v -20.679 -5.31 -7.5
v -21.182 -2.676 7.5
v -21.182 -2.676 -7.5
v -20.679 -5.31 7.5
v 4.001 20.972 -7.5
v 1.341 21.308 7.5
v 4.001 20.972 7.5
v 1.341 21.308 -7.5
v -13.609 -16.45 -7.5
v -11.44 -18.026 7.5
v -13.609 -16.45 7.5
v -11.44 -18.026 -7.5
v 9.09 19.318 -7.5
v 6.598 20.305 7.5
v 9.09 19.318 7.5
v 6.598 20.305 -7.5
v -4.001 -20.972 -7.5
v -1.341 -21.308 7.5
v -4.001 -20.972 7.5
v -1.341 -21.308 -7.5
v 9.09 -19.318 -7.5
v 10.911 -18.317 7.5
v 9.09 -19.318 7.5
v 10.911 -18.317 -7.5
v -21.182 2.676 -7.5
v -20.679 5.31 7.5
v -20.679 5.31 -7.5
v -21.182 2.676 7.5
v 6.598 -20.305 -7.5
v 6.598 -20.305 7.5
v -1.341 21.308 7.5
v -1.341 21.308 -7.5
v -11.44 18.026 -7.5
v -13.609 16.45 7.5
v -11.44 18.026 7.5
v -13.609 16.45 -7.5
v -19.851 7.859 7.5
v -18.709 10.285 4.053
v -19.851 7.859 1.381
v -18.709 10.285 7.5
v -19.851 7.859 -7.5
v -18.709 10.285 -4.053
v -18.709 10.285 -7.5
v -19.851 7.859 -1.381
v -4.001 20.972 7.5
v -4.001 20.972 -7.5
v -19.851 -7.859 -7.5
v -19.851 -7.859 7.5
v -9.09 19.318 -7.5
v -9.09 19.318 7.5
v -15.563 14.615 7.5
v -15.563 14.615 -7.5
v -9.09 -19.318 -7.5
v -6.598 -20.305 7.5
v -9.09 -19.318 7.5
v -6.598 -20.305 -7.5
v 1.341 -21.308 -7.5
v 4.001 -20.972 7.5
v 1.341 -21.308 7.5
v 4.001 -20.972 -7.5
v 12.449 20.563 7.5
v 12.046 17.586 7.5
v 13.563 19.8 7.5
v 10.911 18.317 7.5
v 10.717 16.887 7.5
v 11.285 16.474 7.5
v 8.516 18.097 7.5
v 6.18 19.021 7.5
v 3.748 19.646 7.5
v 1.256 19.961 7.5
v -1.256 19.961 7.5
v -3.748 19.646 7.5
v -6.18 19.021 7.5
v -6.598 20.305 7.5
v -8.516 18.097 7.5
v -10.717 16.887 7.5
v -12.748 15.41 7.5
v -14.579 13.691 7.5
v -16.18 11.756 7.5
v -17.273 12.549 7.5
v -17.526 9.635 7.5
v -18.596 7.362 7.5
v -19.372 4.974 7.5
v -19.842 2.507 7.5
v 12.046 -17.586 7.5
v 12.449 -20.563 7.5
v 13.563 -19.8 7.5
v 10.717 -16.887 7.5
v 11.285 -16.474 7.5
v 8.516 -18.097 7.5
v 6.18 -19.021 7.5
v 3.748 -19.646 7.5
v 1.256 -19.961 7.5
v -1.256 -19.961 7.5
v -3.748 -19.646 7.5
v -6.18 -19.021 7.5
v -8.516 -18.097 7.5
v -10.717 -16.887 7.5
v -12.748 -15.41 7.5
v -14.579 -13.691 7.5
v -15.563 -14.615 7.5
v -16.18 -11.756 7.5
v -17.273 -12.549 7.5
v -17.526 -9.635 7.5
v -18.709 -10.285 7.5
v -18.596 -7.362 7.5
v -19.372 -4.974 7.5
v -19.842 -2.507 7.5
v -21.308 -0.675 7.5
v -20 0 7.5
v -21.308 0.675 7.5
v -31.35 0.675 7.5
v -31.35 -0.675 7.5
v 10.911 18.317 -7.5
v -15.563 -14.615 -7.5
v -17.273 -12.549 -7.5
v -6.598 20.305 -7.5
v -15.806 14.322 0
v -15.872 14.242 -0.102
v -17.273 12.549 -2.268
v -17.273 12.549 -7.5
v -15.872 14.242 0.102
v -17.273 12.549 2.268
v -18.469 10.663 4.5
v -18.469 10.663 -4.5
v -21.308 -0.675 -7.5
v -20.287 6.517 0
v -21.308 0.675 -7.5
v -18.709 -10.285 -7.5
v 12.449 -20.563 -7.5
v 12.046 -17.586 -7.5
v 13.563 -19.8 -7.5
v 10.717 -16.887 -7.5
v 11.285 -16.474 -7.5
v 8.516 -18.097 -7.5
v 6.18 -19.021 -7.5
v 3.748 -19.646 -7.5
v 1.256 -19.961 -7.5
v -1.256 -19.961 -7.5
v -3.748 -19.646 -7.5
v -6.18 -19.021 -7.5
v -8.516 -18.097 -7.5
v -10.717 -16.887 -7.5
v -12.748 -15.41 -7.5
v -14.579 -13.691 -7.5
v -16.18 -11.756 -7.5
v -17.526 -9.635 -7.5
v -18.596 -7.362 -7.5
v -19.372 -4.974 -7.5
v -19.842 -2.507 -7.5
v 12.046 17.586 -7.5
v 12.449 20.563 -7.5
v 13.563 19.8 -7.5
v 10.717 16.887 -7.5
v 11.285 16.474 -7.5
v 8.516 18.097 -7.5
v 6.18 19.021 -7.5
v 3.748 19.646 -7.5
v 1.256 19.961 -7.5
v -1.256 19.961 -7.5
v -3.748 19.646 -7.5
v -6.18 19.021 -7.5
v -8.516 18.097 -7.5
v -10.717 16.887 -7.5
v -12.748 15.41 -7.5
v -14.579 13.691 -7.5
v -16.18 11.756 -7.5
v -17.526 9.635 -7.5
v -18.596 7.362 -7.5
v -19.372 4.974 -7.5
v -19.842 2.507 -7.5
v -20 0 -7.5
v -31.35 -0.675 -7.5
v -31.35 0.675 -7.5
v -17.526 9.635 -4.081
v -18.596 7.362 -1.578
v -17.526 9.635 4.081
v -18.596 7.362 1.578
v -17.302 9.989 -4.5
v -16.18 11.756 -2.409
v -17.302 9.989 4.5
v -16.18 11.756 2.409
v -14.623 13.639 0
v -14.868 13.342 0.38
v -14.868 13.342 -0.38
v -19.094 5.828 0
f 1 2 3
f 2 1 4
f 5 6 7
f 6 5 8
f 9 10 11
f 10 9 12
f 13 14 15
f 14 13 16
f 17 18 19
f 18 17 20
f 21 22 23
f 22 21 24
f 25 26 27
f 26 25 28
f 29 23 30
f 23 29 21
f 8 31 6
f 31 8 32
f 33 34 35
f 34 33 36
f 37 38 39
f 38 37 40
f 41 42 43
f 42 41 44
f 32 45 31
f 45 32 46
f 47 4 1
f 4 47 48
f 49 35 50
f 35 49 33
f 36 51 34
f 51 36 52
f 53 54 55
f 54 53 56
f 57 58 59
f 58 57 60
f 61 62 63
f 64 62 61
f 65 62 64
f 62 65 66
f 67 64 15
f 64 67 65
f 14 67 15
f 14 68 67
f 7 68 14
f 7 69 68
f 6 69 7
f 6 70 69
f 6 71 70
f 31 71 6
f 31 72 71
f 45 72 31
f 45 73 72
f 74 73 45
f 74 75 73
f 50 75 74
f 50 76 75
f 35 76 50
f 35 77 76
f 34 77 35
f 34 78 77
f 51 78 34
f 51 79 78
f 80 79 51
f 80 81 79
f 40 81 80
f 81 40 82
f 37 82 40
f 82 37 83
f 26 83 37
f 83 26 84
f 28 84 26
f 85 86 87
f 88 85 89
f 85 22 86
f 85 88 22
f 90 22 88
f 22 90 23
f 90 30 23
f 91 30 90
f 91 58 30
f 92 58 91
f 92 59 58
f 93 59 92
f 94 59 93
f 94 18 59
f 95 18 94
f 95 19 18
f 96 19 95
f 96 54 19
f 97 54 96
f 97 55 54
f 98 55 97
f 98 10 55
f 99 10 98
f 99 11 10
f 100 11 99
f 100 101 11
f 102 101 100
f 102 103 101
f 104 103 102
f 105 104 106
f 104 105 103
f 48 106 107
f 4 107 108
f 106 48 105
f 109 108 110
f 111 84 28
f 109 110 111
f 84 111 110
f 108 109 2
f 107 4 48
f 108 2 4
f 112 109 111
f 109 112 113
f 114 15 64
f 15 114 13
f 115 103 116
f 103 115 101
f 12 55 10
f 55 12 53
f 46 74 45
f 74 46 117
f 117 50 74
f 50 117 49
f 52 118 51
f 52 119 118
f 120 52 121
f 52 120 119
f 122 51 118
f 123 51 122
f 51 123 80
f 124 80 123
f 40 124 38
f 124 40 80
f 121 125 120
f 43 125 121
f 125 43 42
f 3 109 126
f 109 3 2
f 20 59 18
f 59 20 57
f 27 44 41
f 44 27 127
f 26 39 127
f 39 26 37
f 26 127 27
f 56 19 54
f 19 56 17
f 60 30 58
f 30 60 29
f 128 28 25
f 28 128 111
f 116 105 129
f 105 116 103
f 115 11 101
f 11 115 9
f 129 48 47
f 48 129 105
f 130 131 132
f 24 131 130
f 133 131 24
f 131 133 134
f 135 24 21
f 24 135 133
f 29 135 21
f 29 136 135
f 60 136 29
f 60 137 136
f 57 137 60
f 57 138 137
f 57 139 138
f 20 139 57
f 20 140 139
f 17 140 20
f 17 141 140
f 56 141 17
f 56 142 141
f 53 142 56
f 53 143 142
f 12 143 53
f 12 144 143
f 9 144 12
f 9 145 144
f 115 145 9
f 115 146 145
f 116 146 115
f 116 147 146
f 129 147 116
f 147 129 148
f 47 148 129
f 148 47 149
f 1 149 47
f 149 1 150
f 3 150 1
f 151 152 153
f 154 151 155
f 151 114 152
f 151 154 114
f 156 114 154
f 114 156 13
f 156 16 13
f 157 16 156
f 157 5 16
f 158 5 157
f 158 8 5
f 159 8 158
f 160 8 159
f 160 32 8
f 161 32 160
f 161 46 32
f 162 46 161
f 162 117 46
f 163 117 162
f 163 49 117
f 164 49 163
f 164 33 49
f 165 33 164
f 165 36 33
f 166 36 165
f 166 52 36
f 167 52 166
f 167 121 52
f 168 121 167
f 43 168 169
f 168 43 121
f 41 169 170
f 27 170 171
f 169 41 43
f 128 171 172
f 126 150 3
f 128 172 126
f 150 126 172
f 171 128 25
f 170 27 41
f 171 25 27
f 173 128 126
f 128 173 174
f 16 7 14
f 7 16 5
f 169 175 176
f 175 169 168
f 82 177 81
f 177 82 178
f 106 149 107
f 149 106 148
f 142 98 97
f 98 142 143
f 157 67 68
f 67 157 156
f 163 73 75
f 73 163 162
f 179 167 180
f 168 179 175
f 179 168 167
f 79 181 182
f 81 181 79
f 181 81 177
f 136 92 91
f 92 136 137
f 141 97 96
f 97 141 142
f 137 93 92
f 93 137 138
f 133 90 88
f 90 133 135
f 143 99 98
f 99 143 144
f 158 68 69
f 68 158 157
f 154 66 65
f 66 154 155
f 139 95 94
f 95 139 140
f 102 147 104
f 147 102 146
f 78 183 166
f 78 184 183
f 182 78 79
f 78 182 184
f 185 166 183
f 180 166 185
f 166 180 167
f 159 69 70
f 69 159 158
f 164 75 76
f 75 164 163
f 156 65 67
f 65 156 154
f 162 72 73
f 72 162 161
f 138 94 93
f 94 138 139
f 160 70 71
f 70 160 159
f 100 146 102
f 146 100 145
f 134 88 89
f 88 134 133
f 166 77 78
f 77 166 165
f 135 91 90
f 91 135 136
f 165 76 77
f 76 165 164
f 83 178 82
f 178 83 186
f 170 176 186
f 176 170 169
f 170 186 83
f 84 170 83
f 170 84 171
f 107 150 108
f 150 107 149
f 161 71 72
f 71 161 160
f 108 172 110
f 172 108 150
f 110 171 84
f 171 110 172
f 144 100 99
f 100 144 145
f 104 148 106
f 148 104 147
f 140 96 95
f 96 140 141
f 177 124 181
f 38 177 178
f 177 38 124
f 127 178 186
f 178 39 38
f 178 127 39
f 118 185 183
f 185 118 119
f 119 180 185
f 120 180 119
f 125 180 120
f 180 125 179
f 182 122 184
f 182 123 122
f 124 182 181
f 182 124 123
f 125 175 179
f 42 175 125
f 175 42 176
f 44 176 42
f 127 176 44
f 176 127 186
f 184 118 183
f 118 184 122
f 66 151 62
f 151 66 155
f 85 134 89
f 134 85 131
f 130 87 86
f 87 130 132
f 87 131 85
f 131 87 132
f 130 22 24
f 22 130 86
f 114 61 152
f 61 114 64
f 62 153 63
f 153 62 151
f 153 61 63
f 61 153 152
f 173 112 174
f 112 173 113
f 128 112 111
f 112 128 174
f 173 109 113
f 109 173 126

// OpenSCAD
/*
 * Wire Spool Clamp (Parametric), v0.42
 *
 * by Alex Franke (CodeCreations), Jan 2013
 * http://www.theFrankes.com
 * 
 * Licenced under Creative Commons Attribution - Non-Commercial - Share Alike 3.0 
 * 
 * DESCRIPTION: This will help keep spooled wire in its place. 
 * 
 * INSTRUCTIONS: Choose some values in the "User-defined values" section if 
 *   necessary, render, and print. The default values fit a typical wire spool 
 *   found at Radio Shack. 
 * 
 * v0.42, Jan 30, 2013: Initial Release.
 * 
 * TODO: 
 *   * None at this time
 */

/////////////////////////////////////////////////////////////////////////////
// User-defined values... 
/////////////////////////////////////////////////////////////////////////////

// The width of the spool clip.
width = 15;

// The inner diameter of the clip. (Go a bit small here because it bends open.)
diameter = 40;

// The thickness of the printed material. (Fine tune it for your printer.)
thickness = 1.35;

// The length of the tab/handle.
tabLength = 10; 

// The size of the opening at the back of the clip (not the window).
opening = 33; 

// The length of the guides on both sides of the back. 
guideLength = 4; 

// The amount of material on either side of the window. 
windowMargin = 3; 

// The angle position of the window.
windowAngle = 30; 

// General curve quality 
$fn = 50; 


/////////////////////////////////////////////////////////////////////////////
// The code... 
/////////////////////////////////////////////////////////////////////////////

angle = asin(opening/diameter);

union() {
	rodClamp( diameter, thickness, width, opening ); 

	for(y=[-1,1]) {
		rotate([0,0,angle*y])	
			translate([guideLength/2+diameter/2,thickness/2*y,0]) 
				cube([guideLength, thickness, width], center=true);
	}

	// tab
	translate([-(tabLength+diameter+thickness)/2,0,0]) 
	cube([tabLength+thickness,thickness,width], center=true);

}

// taken from my snapconnector.scad and then modified quite a bit... 
module rodClamp(rodDiameter=8, thickness=2, length=8, opening=6) {
	angle = asin(opening/rodDiameter);
	h = rodDiameter/2+thickness+1;
	x = cos(angle)*h; 
	y = sin(angle)*h;
	x2 = h/cos(angle);
	windowSide = (length/2-windowMargin)/cos(45);

	difference() {
		cylinder(h=length, r=rodDiameter/2 + thickness, center=true);
		cylinder(h=length+1, r=rodDiameter/2, center=true);

		rotate([0,0,-windowAngle]) 
			translate([-(rodDiameter/2+thickness)/2,0,0]) 
				rotate([45,0,0]) 
					cube([rodDiameter/2+thickness, windowSide, windowSide], center=true);
		
		linear_extrude(height=length+1, center=true) 
			polygon(points=[[0,0],[x,y],[x2,0],[x,-y]]);
	}
}
